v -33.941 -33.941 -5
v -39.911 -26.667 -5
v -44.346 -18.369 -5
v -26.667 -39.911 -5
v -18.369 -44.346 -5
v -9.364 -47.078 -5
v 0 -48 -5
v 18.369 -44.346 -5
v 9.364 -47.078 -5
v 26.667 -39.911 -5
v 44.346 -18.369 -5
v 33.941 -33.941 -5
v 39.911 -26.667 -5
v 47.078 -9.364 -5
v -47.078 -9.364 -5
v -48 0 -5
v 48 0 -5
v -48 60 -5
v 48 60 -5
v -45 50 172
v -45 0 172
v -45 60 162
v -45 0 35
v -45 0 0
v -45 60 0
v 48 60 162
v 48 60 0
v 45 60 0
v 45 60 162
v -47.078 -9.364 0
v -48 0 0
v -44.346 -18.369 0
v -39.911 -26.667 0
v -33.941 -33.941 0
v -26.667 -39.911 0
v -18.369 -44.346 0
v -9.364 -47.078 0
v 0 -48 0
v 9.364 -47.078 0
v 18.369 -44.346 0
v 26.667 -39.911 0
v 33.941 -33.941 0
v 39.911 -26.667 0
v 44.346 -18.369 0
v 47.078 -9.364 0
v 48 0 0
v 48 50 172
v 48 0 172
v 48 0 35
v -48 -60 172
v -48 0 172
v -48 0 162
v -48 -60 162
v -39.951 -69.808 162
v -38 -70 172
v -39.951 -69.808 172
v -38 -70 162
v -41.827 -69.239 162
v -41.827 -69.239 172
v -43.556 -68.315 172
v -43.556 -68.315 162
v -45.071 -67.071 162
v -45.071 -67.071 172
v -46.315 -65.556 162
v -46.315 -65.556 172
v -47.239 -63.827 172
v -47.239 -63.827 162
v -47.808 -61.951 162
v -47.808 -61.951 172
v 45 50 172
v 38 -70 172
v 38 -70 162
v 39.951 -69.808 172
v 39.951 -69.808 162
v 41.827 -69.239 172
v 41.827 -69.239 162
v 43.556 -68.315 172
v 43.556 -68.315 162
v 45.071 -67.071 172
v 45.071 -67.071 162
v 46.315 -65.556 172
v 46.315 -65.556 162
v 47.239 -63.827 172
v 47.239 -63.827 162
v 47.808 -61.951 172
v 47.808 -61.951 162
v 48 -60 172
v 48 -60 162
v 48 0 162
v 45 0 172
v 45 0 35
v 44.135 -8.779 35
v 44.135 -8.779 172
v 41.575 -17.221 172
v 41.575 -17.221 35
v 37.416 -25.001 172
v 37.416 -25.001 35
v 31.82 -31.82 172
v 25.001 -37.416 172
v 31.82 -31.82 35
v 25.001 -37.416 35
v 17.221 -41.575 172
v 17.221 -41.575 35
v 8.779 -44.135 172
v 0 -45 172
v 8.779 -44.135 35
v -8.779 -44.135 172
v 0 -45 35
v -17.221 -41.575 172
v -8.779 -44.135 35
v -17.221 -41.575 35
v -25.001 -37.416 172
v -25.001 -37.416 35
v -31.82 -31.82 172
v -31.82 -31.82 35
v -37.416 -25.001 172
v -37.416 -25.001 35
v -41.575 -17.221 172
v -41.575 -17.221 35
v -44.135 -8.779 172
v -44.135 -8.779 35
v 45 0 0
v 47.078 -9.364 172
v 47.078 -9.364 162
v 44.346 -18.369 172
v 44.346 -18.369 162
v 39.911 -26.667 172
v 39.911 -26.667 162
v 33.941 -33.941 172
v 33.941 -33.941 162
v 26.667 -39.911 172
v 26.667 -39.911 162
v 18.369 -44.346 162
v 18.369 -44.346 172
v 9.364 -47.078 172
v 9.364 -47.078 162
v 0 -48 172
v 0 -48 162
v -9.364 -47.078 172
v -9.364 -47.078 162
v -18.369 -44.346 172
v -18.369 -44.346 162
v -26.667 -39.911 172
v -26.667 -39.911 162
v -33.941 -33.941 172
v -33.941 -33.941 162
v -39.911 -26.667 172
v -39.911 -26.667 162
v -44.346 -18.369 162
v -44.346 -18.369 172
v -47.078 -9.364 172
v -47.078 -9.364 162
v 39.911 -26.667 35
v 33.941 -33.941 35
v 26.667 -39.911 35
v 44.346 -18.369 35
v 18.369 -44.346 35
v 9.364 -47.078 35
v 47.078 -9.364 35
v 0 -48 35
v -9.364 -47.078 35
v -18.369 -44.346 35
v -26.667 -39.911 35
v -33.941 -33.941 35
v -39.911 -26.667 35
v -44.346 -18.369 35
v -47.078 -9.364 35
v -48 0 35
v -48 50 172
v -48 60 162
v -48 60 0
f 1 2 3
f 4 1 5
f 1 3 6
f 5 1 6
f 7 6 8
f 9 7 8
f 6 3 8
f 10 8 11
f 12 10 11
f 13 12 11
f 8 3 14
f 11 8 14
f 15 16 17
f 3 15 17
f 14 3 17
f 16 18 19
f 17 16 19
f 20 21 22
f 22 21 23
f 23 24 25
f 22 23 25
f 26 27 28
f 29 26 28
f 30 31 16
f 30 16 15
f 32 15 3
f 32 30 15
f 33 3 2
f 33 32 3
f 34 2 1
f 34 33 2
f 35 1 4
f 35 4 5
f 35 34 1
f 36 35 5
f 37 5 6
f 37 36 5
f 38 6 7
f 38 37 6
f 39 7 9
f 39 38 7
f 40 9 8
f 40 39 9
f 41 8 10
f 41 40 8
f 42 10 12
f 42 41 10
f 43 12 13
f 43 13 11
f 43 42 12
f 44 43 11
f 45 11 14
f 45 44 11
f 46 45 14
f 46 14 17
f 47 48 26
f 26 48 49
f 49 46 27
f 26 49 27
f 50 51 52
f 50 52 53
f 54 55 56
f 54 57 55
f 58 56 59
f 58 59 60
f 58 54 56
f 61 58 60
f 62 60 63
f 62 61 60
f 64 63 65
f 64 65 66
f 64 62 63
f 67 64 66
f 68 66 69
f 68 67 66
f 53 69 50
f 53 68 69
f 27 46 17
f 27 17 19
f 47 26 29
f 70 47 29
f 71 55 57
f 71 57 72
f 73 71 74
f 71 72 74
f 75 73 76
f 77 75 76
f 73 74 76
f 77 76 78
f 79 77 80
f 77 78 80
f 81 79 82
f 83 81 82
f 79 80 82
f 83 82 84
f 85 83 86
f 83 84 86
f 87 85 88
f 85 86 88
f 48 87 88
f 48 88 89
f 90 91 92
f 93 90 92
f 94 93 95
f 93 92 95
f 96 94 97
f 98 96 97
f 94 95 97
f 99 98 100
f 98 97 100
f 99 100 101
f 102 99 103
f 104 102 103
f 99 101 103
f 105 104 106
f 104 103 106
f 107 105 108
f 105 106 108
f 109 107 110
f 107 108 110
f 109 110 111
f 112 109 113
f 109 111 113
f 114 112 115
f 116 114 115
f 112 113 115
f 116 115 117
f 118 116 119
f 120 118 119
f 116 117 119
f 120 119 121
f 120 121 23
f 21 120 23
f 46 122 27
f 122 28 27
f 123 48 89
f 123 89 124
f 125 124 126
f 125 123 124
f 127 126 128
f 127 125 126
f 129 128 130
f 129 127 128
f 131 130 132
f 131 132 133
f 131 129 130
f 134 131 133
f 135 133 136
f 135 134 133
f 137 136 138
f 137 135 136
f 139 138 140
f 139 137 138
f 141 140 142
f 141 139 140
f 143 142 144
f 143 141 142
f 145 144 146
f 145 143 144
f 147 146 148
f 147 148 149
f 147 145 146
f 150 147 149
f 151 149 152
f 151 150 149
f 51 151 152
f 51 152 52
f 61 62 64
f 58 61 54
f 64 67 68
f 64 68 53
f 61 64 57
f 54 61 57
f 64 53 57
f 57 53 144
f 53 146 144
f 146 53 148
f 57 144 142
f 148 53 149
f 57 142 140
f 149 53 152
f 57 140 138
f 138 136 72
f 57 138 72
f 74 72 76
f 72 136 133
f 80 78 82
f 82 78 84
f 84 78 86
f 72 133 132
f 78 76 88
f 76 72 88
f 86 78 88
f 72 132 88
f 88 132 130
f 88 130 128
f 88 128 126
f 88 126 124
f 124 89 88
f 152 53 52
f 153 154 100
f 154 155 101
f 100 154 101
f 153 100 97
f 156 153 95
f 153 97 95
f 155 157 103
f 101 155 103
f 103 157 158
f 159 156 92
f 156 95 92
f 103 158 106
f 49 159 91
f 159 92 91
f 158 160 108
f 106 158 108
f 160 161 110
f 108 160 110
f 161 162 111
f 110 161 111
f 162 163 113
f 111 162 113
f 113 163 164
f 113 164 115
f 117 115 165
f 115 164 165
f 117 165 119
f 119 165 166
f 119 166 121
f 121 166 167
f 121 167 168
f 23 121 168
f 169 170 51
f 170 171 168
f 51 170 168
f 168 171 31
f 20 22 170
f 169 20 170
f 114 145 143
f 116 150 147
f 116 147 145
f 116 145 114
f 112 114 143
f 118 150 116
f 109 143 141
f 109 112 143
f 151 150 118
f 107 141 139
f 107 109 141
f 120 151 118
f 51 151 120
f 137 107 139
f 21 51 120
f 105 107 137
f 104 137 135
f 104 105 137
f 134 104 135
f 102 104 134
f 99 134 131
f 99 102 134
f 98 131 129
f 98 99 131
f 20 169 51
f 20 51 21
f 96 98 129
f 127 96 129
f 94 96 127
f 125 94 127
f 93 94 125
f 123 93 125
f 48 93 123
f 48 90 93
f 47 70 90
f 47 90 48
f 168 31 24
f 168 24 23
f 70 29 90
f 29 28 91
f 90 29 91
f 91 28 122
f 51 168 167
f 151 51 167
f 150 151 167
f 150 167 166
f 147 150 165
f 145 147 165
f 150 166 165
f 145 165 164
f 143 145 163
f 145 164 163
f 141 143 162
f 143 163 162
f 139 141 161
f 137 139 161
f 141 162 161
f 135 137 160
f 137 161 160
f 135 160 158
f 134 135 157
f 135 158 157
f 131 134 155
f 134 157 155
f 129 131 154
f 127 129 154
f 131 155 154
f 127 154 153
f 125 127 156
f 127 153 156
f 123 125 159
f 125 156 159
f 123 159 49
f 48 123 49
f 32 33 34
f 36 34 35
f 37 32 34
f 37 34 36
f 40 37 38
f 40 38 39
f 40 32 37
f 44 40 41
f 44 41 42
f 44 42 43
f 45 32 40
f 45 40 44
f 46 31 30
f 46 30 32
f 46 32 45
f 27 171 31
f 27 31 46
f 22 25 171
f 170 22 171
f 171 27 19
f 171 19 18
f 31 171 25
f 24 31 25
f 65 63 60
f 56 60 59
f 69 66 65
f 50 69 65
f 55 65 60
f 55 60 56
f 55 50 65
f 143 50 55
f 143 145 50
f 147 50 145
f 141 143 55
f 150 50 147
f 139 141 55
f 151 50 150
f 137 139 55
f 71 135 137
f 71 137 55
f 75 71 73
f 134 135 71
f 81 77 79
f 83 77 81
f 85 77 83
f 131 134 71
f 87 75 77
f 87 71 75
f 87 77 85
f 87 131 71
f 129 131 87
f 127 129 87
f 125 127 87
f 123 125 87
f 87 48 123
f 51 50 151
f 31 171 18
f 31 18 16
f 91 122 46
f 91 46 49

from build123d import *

# Parameters (mm, degrees)
BASE_FLANGE1_DEPTH  = 172
BOSS_EXTRUDE1_DEPTH = 5
SKETCH7_W           = 35
SKETCH7_H           = 48
CUT_EXTRUDE1_DEPTH  = 206.91260282
BOSS_EXTRUDE2_DEPTH = 10
FILLET1_R           = 10
CHAMFER1_SIZE       = 10


# Read off the part's stored shape, not the designer's step: Base-Flange1
with BuildPart() as part:
    # Base-Flange1 outline → Base-Flange1 (new body)
    with BuildSketch(Plane.XY):
        with BuildLine():
            Line((48, 0), (48, 60))
            Line((48, 60), (45, 60))
            Line((45, 60), (45, 0))
            ThreePointArc((45, 0), (0, -45), (-45, 0))
            Line((-45, 0), (-45, 60))
            Line((-45, 60), (-48, 60))
            Line((-48, 60), (-48, 0))
            ThreePointArc((-48, 0), (0, -48), (48, 0))
        make_face()
    extrude(amount=BASE_FLANGE1_DEPTH)

    # Sketch7 → Cut-Extrude1 (cut, through all)
    with BuildSketch(Plane.ZY.offset(48)):
        with Locations((17.5, -24)):
            Rectangle(SKETCH7_W, SKETCH7_H)
    extrude(amount=-CUT_EXTRUDE1_DEPTH, mode=Mode.SUBTRACT)

    # Chamfer1
    chamfer1_edges = [part.edges().sort_by_distance(p)[0] for p in [
        (-46.5, 60, 172),
        (46.5, 60, 172),
    ]]
    chamfer(chamfer1_edges, length=CHAMFER1_SIZE)


with BuildPart() as body_2:
    # Sketch6 → Boss-Extrude1 (new body)
    with BuildSketch(Plane(origin=(0, 0, 0), x_dir=(-1, 0, 0), z_dir=(0, 0, -1))):
        with BuildLine():
            Line((48, 60), (48, 0))
            ThreePointArc((48, 0), (0, -48), (-48, 0))
            Line((-48, 0), (-48, 60))
            Line((-48, 60), (48, 60))
        make_face()
    extrude(amount=BOSS_EXTRUDE1_DEPTH)


with BuildPart() as body_3:
    # Sketch8 → Boss-Extrude2 (new body)
    with BuildSketch(Plane.XY.offset(172)):
        with BuildLine():
            Line((-48, -70), (48, -70))
            Line((48, -70), (48, 0))
            ThreePointArc((48, 0), (0, -48), (-48, 0))
            Line((-48, 0), (-48, -70))
        make_face()
    extrude(amount=-BOSS_EXTRUDE2_DEPTH)

    # Fillet1
    fillet1_edges = [body_3.edges().sort_by_distance(p)[0] for p in [
        (-48, -70, 167),
        (48, -70, 167),
    ]]
    fillet(fillet1_edges, radius=FILLET1_R)


solid = Compound([part.part, body_2.part, body_3.part])
